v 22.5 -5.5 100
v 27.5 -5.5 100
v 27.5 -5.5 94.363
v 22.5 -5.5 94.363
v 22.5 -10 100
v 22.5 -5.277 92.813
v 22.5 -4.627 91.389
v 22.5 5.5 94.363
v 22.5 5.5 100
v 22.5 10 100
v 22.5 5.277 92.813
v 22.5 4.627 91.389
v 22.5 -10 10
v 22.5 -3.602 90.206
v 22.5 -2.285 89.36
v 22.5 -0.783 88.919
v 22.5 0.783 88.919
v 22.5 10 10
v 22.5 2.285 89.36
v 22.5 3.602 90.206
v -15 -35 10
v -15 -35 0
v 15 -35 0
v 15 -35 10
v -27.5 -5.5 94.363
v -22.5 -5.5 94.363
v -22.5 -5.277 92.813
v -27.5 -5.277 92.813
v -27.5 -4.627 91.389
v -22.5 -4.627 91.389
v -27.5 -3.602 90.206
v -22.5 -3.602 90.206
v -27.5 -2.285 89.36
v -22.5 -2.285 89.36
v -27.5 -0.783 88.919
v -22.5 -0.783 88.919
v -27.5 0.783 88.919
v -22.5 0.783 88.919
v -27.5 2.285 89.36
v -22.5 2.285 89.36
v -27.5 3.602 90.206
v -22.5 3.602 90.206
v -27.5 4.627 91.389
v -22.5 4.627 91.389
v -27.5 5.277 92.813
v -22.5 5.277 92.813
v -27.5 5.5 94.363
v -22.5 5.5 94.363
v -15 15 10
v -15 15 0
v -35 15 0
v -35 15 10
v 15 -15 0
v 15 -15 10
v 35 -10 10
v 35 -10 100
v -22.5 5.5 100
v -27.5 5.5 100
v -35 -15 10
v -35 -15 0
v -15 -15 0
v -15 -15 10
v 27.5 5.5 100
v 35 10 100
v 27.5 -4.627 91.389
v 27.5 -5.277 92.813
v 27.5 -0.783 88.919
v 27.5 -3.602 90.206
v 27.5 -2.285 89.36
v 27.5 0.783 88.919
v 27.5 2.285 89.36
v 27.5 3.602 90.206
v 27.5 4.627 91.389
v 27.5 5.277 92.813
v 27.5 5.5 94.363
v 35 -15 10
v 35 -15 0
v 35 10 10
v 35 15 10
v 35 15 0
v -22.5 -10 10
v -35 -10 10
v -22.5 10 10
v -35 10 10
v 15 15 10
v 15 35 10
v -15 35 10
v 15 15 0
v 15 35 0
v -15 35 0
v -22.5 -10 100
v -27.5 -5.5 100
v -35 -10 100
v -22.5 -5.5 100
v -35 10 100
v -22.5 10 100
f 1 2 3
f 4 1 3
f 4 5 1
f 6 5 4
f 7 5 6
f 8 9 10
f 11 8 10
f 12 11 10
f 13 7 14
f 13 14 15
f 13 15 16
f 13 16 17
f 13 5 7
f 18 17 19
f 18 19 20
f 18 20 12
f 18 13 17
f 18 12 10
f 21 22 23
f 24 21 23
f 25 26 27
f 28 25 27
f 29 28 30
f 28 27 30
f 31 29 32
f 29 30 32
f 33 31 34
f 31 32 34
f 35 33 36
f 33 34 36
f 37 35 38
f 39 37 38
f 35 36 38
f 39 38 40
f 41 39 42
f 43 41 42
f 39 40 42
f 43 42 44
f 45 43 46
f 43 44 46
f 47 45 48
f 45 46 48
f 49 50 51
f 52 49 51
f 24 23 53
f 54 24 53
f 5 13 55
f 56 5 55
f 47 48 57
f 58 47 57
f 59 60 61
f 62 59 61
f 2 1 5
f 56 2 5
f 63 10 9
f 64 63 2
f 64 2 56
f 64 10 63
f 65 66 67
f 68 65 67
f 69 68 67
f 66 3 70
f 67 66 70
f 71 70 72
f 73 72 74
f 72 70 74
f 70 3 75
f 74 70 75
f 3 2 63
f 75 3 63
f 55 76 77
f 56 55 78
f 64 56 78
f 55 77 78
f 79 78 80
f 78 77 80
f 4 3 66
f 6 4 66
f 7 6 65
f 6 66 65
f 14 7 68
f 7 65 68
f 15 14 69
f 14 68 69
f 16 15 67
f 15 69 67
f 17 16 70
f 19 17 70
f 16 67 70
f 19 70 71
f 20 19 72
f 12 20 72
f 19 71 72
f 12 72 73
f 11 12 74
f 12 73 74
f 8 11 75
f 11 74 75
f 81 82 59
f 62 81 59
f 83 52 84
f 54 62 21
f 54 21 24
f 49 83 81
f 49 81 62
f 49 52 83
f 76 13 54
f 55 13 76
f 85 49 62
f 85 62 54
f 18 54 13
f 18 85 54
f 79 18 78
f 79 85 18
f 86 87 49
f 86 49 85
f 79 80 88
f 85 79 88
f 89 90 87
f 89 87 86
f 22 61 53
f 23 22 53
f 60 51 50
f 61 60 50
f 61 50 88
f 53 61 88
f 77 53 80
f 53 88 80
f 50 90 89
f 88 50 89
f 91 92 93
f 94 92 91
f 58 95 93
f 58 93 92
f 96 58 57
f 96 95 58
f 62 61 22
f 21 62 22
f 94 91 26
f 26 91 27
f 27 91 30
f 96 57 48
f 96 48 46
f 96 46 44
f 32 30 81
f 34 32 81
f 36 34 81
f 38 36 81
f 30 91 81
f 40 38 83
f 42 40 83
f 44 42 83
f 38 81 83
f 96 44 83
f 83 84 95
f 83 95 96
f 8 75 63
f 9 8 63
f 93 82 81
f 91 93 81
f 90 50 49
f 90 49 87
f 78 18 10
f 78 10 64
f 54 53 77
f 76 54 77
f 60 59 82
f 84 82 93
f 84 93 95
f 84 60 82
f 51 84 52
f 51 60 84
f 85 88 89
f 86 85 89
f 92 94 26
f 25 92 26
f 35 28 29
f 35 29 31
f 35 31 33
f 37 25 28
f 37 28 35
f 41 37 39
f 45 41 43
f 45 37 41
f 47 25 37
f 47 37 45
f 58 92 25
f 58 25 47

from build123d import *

# Parameters (mm, degrees)
F0_W     = 20
F0_H     = 30
F0_W_2   = 30
F0_H_2   = 20
F1_DEPTH = 10
F2_W     = 12.5
F2_H     = 20
F3_DEPTH = 100
F5_DEPTH = 27.5


with BuildPart() as f1:
    # F0 (on Top) → F1 (new body)
    with BuildSketch(Plane.XY):
        with Locations((25, 0)):
            Rectangle(F0_W, F0_H)
        with Locations((0, -25)):
            Rectangle(F0_W_2, F0_H_2)
        Rectangle(F0_W_2, F0_H)
        with Locations((-25, 0)):
            Rectangle(F0_W, F0_H)
        with Locations((0, 25)):
            Rectangle(F0_W_2, F0_H_2)
    extrude(amount=F1_DEPTH)

    # F2 (on Top) → F3 (join)
    with BuildSketch(Plane.XY):
        with Locations((-28.75, 0)):
            Rectangle(F2_W, F2_H)
        with Locations((28.75, 0)):
            Rectangle(F2_W, F2_H)
    extrude(amount=F3_DEPTH)

    # F4 (on Right) → F5 (cut, symmetric)
    with BuildSketch(Plane.YZ):
        with BuildLine():
            Line((-5.5, 100), (-5.5, 94.3625420332))
            ThreePointArc((-5.5, 94.3625420332), (0, 88.8625420332), (5.5, 94.3625420332))
            Line((5.5, 94.3625420332), (5.5, 100))
            Line((5.5, 100), (-5.5, 100))
        make_face()
    extrude(amount=F5_DEPTH, both=True, mode=Mode.SUBTRACT)


solid = f1.part
